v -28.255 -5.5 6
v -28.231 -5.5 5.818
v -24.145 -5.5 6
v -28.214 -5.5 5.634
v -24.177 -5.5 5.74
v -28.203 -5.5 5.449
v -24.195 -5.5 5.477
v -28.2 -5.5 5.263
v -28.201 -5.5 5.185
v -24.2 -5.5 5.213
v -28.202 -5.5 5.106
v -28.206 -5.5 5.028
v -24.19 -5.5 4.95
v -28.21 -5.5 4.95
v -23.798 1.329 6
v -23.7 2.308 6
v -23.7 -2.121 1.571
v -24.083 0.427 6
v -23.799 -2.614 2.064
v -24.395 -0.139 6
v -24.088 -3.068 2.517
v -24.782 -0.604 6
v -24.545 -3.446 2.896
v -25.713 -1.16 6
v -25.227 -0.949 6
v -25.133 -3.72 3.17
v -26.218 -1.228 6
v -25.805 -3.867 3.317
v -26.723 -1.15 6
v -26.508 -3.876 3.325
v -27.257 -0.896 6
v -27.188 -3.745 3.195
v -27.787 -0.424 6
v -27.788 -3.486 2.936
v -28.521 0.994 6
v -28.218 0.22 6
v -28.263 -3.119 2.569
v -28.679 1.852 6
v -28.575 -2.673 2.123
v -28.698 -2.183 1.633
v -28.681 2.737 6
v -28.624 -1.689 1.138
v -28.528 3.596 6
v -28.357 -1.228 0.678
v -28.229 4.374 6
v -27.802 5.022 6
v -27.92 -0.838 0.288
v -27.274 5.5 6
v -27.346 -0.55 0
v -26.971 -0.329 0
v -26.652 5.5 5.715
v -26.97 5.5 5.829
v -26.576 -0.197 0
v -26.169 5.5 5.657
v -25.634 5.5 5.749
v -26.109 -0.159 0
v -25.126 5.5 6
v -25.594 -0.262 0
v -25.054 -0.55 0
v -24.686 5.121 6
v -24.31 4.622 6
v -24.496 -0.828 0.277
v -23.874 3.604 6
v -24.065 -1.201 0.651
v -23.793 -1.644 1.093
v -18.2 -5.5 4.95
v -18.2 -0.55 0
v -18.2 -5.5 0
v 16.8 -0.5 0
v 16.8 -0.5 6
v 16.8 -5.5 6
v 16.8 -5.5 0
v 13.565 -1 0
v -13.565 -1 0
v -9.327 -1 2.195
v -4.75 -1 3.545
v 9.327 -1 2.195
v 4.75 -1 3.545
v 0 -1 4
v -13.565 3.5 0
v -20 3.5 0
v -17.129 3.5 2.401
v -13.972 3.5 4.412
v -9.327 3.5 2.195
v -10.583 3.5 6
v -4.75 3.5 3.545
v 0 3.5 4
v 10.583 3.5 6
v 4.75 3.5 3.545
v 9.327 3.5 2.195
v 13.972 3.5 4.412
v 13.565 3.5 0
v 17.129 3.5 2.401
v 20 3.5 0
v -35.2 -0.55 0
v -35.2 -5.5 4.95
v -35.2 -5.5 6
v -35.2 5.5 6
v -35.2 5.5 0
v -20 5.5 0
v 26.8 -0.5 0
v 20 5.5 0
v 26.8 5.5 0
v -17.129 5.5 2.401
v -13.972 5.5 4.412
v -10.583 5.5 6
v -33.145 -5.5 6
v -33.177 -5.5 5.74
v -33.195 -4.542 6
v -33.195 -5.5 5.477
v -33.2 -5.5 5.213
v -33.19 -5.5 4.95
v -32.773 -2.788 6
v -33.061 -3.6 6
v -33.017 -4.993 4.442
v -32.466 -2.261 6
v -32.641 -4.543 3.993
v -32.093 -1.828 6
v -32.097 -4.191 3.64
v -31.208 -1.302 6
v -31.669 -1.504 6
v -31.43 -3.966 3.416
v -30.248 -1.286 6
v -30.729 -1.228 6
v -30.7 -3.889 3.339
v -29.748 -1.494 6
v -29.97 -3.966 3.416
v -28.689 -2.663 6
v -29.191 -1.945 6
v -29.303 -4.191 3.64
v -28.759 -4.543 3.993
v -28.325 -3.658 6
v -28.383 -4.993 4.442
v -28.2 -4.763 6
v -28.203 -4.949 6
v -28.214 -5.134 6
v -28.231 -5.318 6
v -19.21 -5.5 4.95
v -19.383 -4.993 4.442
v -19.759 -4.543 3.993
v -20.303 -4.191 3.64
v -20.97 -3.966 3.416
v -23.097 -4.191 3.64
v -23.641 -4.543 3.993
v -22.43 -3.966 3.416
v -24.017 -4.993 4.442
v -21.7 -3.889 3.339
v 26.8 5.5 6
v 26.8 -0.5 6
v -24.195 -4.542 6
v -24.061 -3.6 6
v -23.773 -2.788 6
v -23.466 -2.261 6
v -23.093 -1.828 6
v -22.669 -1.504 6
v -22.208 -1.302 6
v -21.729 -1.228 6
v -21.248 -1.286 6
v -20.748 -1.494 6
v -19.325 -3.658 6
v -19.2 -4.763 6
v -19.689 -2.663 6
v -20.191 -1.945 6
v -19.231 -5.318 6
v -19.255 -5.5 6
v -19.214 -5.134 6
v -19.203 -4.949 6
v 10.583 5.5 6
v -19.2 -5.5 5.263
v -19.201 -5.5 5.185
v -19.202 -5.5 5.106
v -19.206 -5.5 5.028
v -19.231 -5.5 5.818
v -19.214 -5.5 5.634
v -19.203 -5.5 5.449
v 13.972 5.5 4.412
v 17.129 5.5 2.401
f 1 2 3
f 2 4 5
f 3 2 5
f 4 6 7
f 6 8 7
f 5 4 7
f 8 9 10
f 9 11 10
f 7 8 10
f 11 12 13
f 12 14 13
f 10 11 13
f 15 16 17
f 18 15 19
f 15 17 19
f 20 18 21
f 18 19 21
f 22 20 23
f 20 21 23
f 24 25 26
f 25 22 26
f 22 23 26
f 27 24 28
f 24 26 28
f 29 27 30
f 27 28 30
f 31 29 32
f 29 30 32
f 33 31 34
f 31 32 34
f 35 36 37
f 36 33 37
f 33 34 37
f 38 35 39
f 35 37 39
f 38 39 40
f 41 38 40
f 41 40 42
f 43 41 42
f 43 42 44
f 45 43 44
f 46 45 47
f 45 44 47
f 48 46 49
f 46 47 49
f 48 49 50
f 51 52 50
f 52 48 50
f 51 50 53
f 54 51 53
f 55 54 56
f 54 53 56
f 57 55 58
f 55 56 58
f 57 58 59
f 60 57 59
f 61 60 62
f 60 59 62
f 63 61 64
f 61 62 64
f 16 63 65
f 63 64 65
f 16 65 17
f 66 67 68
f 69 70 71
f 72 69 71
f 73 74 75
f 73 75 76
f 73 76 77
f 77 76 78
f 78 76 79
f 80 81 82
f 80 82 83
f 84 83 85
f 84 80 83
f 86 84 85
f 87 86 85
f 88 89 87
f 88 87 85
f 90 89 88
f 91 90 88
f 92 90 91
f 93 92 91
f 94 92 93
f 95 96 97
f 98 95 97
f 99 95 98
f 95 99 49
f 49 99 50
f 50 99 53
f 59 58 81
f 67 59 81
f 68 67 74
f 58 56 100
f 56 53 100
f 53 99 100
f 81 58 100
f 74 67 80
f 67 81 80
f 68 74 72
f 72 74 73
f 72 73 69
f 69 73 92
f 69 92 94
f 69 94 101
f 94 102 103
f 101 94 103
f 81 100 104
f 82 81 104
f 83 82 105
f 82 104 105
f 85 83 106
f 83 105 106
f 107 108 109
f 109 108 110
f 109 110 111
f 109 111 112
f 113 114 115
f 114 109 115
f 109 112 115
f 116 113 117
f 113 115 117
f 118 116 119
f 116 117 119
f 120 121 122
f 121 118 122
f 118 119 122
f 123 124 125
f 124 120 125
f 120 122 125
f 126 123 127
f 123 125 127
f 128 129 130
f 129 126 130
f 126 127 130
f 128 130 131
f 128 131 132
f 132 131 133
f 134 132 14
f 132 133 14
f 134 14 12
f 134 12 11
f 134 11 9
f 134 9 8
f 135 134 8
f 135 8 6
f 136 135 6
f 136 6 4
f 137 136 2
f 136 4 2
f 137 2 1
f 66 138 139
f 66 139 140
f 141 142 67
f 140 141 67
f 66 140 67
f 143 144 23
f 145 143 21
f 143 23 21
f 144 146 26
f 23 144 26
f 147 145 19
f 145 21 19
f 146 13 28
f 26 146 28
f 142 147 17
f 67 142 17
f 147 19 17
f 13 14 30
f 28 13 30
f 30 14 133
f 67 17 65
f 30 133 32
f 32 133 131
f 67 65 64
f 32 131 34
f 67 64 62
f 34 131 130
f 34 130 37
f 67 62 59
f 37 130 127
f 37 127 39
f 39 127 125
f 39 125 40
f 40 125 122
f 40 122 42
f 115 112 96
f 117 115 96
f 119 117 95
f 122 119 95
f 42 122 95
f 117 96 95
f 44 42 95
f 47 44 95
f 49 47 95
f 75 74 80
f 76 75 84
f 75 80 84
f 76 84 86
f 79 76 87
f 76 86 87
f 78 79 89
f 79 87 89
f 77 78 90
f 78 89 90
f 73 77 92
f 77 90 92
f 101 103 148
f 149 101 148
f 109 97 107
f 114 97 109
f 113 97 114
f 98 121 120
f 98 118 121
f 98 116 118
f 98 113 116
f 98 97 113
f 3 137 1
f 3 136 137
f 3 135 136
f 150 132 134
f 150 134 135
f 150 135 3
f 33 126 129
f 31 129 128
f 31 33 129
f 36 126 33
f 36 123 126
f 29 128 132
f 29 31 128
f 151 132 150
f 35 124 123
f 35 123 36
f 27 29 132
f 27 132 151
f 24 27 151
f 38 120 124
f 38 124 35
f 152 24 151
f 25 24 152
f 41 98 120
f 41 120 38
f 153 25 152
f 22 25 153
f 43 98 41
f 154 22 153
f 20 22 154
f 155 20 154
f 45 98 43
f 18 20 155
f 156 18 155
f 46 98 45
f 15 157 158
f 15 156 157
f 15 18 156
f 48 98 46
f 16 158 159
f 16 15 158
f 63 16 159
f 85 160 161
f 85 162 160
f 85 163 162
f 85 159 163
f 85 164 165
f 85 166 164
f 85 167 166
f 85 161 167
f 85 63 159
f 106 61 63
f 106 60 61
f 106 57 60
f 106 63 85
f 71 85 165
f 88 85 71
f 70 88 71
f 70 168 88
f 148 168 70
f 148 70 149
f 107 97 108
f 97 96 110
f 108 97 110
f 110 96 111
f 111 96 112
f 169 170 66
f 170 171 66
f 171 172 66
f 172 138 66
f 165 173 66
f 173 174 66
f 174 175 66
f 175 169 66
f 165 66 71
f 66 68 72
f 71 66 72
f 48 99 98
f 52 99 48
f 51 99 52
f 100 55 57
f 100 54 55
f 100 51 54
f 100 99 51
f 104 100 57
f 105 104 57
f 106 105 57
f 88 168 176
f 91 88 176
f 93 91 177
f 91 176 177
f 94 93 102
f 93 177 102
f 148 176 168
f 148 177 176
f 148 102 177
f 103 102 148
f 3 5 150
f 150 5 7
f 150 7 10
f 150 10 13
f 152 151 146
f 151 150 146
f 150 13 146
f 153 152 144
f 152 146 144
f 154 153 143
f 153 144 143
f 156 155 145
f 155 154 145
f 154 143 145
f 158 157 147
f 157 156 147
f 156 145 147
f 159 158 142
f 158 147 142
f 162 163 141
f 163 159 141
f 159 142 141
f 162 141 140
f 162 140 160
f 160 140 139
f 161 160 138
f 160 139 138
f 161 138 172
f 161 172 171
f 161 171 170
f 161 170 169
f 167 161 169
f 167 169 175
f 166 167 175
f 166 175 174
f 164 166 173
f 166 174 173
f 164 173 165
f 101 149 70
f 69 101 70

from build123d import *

# Parameters (mm, degrees)
SKETCH_1_W          = 70.4
SKETCH_1_H          = 11
EXTRUDE_1_DEPTH     = 6
CUT_EXTRUDE_1_DEPTH = 6.5
CUT_EXTRUDE_3_DEPTH = 17
CUT_EXTRUDE_4_DEPTH = 2
CUT_EXTRUDE_5_DEPTH = 12
CUT_EXTRUDE_6_DEPTH = 7
SKETCH_11_R         = 2.5
CUT_EXTRUDE_7_DEPTH = 9.52081528


with BuildPart() as part:
    # Эскиз1 → Бобышка-Вытянуть1 (new body)
    with BuildSketch(Plane.XY):
        Rectangle(SKETCH_1_W, SKETCH_1_H)
    extrude(amount=EXTRUDE_1_DEPTH)

    # Эскиз3 → Вырез-Вытянуть1 (cut)
    with BuildSketch(Plane(origin=(0, 5.5, 0), x_dir=(1, 0, 0), z_dir=(0, 1, 0))):
        with BuildLine():
            Line((13.564659966, 0), (-13.564659966, 0))
            ThreePointArc((-13.564659966, 0), (0, -4), (13.564659966, 0))
        make_face()
    extrude(amount=-CUT_EXTRUDE_1_DEPTH, mode=Mode.SUBTRACT)

    # Эскиз6 → Вырез-Вытянуть3 (cut)
    with BuildSketch(Plane.ZY.offset(35.2)):
        Polygon((4.949747468, -5.5), (0, -0.550252532), (0, -5.5), align=None)
    extrude(amount=-CUT_EXTRUDE_3_DEPTH, mode=Mode.SUBTRACT)

    # Эскиз7 → Вырез-Вытянуть4 (cut)
    with BuildSketch(Plane(origin=(0, 5.5, 0), x_dir=(1, 0, 0), z_dir=(0, 1, 0))):
        with BuildLine():
            Line((-13.564659966, 0), (-20, 0))
            ThreePointArc((-20, 0), (-15.583005244, -3.457513111), (-10.583005244, -6))
            Line((-10.583005244, -6), (10.583005244, -6))
            ThreePointArc((10.583005244, -6), (15.583005244, -3.457513111), (20, 0))
            Line((20, 0), (13.564659966, 0))
            ThreePointArc((13.564659966, 0), (0, -4), (-13.564659966, 0))
        make_face()
    extrude(amount=-CUT_EXTRUDE_4_DEPTH, mode=Mode.SUBTRACT)

    # Эскиз9 → Вырез-Вытянуть5 (cut, through all)
    with BuildSketch(Plane(origin=(0, 5.5, 0), x_dir=(1, 0, 0), z_dir=(0, 1, 0))):
        Polygon((26.8, 134.579292019), (26.8, 0), (26.8, -6), (26.8, -140.579292019), (295.958584038, -140.579292019), (295.958584038, 134.579292019), align=None)
    extrude(amount=-CUT_EXTRUDE_5_DEPTH, mode=Mode.SUBTRACT)

    # Эскиз10 → Вырез-Вытянуть6 (cut, through all)
    with BuildSketch(Plane.XY.offset(6)):
        Polygon((16.8, -140.079292019), (16.8, -5.5), (16.8, -0.5), (26.8, -0.5), (161.379292019, -0.5), (348.325311663, -194.142787371), (203.746019644, -333.72207939), align=None)
    extrude(amount=-CUT_EXTRUDE_6_DEPTH, mode=Mode.SUBTRACT)

    # Эскиз11 → Вырез-Вытянуть7 (cut, through all)
    with BuildSketch(Plane(origin=(0, -0.275126266, -0.275126266), x_dir=(1, 0, 0), z_dir=(0, -0.707106781, -0.707106781))):
        with Locations((-26.2, 2.610912703)):
            Circle(SKETCH_11_R)
        with Locations((-30.7, 7.610912703)):
            Circle(SKETCH_11_R)
        with Locations((-21.7, 7.610912703)):
            Circle(SKETCH_11_R)
    extrude(amount=-CUT_EXTRUDE_7_DEPTH, mode=Mode.SUBTRACT)


solid = part.part
